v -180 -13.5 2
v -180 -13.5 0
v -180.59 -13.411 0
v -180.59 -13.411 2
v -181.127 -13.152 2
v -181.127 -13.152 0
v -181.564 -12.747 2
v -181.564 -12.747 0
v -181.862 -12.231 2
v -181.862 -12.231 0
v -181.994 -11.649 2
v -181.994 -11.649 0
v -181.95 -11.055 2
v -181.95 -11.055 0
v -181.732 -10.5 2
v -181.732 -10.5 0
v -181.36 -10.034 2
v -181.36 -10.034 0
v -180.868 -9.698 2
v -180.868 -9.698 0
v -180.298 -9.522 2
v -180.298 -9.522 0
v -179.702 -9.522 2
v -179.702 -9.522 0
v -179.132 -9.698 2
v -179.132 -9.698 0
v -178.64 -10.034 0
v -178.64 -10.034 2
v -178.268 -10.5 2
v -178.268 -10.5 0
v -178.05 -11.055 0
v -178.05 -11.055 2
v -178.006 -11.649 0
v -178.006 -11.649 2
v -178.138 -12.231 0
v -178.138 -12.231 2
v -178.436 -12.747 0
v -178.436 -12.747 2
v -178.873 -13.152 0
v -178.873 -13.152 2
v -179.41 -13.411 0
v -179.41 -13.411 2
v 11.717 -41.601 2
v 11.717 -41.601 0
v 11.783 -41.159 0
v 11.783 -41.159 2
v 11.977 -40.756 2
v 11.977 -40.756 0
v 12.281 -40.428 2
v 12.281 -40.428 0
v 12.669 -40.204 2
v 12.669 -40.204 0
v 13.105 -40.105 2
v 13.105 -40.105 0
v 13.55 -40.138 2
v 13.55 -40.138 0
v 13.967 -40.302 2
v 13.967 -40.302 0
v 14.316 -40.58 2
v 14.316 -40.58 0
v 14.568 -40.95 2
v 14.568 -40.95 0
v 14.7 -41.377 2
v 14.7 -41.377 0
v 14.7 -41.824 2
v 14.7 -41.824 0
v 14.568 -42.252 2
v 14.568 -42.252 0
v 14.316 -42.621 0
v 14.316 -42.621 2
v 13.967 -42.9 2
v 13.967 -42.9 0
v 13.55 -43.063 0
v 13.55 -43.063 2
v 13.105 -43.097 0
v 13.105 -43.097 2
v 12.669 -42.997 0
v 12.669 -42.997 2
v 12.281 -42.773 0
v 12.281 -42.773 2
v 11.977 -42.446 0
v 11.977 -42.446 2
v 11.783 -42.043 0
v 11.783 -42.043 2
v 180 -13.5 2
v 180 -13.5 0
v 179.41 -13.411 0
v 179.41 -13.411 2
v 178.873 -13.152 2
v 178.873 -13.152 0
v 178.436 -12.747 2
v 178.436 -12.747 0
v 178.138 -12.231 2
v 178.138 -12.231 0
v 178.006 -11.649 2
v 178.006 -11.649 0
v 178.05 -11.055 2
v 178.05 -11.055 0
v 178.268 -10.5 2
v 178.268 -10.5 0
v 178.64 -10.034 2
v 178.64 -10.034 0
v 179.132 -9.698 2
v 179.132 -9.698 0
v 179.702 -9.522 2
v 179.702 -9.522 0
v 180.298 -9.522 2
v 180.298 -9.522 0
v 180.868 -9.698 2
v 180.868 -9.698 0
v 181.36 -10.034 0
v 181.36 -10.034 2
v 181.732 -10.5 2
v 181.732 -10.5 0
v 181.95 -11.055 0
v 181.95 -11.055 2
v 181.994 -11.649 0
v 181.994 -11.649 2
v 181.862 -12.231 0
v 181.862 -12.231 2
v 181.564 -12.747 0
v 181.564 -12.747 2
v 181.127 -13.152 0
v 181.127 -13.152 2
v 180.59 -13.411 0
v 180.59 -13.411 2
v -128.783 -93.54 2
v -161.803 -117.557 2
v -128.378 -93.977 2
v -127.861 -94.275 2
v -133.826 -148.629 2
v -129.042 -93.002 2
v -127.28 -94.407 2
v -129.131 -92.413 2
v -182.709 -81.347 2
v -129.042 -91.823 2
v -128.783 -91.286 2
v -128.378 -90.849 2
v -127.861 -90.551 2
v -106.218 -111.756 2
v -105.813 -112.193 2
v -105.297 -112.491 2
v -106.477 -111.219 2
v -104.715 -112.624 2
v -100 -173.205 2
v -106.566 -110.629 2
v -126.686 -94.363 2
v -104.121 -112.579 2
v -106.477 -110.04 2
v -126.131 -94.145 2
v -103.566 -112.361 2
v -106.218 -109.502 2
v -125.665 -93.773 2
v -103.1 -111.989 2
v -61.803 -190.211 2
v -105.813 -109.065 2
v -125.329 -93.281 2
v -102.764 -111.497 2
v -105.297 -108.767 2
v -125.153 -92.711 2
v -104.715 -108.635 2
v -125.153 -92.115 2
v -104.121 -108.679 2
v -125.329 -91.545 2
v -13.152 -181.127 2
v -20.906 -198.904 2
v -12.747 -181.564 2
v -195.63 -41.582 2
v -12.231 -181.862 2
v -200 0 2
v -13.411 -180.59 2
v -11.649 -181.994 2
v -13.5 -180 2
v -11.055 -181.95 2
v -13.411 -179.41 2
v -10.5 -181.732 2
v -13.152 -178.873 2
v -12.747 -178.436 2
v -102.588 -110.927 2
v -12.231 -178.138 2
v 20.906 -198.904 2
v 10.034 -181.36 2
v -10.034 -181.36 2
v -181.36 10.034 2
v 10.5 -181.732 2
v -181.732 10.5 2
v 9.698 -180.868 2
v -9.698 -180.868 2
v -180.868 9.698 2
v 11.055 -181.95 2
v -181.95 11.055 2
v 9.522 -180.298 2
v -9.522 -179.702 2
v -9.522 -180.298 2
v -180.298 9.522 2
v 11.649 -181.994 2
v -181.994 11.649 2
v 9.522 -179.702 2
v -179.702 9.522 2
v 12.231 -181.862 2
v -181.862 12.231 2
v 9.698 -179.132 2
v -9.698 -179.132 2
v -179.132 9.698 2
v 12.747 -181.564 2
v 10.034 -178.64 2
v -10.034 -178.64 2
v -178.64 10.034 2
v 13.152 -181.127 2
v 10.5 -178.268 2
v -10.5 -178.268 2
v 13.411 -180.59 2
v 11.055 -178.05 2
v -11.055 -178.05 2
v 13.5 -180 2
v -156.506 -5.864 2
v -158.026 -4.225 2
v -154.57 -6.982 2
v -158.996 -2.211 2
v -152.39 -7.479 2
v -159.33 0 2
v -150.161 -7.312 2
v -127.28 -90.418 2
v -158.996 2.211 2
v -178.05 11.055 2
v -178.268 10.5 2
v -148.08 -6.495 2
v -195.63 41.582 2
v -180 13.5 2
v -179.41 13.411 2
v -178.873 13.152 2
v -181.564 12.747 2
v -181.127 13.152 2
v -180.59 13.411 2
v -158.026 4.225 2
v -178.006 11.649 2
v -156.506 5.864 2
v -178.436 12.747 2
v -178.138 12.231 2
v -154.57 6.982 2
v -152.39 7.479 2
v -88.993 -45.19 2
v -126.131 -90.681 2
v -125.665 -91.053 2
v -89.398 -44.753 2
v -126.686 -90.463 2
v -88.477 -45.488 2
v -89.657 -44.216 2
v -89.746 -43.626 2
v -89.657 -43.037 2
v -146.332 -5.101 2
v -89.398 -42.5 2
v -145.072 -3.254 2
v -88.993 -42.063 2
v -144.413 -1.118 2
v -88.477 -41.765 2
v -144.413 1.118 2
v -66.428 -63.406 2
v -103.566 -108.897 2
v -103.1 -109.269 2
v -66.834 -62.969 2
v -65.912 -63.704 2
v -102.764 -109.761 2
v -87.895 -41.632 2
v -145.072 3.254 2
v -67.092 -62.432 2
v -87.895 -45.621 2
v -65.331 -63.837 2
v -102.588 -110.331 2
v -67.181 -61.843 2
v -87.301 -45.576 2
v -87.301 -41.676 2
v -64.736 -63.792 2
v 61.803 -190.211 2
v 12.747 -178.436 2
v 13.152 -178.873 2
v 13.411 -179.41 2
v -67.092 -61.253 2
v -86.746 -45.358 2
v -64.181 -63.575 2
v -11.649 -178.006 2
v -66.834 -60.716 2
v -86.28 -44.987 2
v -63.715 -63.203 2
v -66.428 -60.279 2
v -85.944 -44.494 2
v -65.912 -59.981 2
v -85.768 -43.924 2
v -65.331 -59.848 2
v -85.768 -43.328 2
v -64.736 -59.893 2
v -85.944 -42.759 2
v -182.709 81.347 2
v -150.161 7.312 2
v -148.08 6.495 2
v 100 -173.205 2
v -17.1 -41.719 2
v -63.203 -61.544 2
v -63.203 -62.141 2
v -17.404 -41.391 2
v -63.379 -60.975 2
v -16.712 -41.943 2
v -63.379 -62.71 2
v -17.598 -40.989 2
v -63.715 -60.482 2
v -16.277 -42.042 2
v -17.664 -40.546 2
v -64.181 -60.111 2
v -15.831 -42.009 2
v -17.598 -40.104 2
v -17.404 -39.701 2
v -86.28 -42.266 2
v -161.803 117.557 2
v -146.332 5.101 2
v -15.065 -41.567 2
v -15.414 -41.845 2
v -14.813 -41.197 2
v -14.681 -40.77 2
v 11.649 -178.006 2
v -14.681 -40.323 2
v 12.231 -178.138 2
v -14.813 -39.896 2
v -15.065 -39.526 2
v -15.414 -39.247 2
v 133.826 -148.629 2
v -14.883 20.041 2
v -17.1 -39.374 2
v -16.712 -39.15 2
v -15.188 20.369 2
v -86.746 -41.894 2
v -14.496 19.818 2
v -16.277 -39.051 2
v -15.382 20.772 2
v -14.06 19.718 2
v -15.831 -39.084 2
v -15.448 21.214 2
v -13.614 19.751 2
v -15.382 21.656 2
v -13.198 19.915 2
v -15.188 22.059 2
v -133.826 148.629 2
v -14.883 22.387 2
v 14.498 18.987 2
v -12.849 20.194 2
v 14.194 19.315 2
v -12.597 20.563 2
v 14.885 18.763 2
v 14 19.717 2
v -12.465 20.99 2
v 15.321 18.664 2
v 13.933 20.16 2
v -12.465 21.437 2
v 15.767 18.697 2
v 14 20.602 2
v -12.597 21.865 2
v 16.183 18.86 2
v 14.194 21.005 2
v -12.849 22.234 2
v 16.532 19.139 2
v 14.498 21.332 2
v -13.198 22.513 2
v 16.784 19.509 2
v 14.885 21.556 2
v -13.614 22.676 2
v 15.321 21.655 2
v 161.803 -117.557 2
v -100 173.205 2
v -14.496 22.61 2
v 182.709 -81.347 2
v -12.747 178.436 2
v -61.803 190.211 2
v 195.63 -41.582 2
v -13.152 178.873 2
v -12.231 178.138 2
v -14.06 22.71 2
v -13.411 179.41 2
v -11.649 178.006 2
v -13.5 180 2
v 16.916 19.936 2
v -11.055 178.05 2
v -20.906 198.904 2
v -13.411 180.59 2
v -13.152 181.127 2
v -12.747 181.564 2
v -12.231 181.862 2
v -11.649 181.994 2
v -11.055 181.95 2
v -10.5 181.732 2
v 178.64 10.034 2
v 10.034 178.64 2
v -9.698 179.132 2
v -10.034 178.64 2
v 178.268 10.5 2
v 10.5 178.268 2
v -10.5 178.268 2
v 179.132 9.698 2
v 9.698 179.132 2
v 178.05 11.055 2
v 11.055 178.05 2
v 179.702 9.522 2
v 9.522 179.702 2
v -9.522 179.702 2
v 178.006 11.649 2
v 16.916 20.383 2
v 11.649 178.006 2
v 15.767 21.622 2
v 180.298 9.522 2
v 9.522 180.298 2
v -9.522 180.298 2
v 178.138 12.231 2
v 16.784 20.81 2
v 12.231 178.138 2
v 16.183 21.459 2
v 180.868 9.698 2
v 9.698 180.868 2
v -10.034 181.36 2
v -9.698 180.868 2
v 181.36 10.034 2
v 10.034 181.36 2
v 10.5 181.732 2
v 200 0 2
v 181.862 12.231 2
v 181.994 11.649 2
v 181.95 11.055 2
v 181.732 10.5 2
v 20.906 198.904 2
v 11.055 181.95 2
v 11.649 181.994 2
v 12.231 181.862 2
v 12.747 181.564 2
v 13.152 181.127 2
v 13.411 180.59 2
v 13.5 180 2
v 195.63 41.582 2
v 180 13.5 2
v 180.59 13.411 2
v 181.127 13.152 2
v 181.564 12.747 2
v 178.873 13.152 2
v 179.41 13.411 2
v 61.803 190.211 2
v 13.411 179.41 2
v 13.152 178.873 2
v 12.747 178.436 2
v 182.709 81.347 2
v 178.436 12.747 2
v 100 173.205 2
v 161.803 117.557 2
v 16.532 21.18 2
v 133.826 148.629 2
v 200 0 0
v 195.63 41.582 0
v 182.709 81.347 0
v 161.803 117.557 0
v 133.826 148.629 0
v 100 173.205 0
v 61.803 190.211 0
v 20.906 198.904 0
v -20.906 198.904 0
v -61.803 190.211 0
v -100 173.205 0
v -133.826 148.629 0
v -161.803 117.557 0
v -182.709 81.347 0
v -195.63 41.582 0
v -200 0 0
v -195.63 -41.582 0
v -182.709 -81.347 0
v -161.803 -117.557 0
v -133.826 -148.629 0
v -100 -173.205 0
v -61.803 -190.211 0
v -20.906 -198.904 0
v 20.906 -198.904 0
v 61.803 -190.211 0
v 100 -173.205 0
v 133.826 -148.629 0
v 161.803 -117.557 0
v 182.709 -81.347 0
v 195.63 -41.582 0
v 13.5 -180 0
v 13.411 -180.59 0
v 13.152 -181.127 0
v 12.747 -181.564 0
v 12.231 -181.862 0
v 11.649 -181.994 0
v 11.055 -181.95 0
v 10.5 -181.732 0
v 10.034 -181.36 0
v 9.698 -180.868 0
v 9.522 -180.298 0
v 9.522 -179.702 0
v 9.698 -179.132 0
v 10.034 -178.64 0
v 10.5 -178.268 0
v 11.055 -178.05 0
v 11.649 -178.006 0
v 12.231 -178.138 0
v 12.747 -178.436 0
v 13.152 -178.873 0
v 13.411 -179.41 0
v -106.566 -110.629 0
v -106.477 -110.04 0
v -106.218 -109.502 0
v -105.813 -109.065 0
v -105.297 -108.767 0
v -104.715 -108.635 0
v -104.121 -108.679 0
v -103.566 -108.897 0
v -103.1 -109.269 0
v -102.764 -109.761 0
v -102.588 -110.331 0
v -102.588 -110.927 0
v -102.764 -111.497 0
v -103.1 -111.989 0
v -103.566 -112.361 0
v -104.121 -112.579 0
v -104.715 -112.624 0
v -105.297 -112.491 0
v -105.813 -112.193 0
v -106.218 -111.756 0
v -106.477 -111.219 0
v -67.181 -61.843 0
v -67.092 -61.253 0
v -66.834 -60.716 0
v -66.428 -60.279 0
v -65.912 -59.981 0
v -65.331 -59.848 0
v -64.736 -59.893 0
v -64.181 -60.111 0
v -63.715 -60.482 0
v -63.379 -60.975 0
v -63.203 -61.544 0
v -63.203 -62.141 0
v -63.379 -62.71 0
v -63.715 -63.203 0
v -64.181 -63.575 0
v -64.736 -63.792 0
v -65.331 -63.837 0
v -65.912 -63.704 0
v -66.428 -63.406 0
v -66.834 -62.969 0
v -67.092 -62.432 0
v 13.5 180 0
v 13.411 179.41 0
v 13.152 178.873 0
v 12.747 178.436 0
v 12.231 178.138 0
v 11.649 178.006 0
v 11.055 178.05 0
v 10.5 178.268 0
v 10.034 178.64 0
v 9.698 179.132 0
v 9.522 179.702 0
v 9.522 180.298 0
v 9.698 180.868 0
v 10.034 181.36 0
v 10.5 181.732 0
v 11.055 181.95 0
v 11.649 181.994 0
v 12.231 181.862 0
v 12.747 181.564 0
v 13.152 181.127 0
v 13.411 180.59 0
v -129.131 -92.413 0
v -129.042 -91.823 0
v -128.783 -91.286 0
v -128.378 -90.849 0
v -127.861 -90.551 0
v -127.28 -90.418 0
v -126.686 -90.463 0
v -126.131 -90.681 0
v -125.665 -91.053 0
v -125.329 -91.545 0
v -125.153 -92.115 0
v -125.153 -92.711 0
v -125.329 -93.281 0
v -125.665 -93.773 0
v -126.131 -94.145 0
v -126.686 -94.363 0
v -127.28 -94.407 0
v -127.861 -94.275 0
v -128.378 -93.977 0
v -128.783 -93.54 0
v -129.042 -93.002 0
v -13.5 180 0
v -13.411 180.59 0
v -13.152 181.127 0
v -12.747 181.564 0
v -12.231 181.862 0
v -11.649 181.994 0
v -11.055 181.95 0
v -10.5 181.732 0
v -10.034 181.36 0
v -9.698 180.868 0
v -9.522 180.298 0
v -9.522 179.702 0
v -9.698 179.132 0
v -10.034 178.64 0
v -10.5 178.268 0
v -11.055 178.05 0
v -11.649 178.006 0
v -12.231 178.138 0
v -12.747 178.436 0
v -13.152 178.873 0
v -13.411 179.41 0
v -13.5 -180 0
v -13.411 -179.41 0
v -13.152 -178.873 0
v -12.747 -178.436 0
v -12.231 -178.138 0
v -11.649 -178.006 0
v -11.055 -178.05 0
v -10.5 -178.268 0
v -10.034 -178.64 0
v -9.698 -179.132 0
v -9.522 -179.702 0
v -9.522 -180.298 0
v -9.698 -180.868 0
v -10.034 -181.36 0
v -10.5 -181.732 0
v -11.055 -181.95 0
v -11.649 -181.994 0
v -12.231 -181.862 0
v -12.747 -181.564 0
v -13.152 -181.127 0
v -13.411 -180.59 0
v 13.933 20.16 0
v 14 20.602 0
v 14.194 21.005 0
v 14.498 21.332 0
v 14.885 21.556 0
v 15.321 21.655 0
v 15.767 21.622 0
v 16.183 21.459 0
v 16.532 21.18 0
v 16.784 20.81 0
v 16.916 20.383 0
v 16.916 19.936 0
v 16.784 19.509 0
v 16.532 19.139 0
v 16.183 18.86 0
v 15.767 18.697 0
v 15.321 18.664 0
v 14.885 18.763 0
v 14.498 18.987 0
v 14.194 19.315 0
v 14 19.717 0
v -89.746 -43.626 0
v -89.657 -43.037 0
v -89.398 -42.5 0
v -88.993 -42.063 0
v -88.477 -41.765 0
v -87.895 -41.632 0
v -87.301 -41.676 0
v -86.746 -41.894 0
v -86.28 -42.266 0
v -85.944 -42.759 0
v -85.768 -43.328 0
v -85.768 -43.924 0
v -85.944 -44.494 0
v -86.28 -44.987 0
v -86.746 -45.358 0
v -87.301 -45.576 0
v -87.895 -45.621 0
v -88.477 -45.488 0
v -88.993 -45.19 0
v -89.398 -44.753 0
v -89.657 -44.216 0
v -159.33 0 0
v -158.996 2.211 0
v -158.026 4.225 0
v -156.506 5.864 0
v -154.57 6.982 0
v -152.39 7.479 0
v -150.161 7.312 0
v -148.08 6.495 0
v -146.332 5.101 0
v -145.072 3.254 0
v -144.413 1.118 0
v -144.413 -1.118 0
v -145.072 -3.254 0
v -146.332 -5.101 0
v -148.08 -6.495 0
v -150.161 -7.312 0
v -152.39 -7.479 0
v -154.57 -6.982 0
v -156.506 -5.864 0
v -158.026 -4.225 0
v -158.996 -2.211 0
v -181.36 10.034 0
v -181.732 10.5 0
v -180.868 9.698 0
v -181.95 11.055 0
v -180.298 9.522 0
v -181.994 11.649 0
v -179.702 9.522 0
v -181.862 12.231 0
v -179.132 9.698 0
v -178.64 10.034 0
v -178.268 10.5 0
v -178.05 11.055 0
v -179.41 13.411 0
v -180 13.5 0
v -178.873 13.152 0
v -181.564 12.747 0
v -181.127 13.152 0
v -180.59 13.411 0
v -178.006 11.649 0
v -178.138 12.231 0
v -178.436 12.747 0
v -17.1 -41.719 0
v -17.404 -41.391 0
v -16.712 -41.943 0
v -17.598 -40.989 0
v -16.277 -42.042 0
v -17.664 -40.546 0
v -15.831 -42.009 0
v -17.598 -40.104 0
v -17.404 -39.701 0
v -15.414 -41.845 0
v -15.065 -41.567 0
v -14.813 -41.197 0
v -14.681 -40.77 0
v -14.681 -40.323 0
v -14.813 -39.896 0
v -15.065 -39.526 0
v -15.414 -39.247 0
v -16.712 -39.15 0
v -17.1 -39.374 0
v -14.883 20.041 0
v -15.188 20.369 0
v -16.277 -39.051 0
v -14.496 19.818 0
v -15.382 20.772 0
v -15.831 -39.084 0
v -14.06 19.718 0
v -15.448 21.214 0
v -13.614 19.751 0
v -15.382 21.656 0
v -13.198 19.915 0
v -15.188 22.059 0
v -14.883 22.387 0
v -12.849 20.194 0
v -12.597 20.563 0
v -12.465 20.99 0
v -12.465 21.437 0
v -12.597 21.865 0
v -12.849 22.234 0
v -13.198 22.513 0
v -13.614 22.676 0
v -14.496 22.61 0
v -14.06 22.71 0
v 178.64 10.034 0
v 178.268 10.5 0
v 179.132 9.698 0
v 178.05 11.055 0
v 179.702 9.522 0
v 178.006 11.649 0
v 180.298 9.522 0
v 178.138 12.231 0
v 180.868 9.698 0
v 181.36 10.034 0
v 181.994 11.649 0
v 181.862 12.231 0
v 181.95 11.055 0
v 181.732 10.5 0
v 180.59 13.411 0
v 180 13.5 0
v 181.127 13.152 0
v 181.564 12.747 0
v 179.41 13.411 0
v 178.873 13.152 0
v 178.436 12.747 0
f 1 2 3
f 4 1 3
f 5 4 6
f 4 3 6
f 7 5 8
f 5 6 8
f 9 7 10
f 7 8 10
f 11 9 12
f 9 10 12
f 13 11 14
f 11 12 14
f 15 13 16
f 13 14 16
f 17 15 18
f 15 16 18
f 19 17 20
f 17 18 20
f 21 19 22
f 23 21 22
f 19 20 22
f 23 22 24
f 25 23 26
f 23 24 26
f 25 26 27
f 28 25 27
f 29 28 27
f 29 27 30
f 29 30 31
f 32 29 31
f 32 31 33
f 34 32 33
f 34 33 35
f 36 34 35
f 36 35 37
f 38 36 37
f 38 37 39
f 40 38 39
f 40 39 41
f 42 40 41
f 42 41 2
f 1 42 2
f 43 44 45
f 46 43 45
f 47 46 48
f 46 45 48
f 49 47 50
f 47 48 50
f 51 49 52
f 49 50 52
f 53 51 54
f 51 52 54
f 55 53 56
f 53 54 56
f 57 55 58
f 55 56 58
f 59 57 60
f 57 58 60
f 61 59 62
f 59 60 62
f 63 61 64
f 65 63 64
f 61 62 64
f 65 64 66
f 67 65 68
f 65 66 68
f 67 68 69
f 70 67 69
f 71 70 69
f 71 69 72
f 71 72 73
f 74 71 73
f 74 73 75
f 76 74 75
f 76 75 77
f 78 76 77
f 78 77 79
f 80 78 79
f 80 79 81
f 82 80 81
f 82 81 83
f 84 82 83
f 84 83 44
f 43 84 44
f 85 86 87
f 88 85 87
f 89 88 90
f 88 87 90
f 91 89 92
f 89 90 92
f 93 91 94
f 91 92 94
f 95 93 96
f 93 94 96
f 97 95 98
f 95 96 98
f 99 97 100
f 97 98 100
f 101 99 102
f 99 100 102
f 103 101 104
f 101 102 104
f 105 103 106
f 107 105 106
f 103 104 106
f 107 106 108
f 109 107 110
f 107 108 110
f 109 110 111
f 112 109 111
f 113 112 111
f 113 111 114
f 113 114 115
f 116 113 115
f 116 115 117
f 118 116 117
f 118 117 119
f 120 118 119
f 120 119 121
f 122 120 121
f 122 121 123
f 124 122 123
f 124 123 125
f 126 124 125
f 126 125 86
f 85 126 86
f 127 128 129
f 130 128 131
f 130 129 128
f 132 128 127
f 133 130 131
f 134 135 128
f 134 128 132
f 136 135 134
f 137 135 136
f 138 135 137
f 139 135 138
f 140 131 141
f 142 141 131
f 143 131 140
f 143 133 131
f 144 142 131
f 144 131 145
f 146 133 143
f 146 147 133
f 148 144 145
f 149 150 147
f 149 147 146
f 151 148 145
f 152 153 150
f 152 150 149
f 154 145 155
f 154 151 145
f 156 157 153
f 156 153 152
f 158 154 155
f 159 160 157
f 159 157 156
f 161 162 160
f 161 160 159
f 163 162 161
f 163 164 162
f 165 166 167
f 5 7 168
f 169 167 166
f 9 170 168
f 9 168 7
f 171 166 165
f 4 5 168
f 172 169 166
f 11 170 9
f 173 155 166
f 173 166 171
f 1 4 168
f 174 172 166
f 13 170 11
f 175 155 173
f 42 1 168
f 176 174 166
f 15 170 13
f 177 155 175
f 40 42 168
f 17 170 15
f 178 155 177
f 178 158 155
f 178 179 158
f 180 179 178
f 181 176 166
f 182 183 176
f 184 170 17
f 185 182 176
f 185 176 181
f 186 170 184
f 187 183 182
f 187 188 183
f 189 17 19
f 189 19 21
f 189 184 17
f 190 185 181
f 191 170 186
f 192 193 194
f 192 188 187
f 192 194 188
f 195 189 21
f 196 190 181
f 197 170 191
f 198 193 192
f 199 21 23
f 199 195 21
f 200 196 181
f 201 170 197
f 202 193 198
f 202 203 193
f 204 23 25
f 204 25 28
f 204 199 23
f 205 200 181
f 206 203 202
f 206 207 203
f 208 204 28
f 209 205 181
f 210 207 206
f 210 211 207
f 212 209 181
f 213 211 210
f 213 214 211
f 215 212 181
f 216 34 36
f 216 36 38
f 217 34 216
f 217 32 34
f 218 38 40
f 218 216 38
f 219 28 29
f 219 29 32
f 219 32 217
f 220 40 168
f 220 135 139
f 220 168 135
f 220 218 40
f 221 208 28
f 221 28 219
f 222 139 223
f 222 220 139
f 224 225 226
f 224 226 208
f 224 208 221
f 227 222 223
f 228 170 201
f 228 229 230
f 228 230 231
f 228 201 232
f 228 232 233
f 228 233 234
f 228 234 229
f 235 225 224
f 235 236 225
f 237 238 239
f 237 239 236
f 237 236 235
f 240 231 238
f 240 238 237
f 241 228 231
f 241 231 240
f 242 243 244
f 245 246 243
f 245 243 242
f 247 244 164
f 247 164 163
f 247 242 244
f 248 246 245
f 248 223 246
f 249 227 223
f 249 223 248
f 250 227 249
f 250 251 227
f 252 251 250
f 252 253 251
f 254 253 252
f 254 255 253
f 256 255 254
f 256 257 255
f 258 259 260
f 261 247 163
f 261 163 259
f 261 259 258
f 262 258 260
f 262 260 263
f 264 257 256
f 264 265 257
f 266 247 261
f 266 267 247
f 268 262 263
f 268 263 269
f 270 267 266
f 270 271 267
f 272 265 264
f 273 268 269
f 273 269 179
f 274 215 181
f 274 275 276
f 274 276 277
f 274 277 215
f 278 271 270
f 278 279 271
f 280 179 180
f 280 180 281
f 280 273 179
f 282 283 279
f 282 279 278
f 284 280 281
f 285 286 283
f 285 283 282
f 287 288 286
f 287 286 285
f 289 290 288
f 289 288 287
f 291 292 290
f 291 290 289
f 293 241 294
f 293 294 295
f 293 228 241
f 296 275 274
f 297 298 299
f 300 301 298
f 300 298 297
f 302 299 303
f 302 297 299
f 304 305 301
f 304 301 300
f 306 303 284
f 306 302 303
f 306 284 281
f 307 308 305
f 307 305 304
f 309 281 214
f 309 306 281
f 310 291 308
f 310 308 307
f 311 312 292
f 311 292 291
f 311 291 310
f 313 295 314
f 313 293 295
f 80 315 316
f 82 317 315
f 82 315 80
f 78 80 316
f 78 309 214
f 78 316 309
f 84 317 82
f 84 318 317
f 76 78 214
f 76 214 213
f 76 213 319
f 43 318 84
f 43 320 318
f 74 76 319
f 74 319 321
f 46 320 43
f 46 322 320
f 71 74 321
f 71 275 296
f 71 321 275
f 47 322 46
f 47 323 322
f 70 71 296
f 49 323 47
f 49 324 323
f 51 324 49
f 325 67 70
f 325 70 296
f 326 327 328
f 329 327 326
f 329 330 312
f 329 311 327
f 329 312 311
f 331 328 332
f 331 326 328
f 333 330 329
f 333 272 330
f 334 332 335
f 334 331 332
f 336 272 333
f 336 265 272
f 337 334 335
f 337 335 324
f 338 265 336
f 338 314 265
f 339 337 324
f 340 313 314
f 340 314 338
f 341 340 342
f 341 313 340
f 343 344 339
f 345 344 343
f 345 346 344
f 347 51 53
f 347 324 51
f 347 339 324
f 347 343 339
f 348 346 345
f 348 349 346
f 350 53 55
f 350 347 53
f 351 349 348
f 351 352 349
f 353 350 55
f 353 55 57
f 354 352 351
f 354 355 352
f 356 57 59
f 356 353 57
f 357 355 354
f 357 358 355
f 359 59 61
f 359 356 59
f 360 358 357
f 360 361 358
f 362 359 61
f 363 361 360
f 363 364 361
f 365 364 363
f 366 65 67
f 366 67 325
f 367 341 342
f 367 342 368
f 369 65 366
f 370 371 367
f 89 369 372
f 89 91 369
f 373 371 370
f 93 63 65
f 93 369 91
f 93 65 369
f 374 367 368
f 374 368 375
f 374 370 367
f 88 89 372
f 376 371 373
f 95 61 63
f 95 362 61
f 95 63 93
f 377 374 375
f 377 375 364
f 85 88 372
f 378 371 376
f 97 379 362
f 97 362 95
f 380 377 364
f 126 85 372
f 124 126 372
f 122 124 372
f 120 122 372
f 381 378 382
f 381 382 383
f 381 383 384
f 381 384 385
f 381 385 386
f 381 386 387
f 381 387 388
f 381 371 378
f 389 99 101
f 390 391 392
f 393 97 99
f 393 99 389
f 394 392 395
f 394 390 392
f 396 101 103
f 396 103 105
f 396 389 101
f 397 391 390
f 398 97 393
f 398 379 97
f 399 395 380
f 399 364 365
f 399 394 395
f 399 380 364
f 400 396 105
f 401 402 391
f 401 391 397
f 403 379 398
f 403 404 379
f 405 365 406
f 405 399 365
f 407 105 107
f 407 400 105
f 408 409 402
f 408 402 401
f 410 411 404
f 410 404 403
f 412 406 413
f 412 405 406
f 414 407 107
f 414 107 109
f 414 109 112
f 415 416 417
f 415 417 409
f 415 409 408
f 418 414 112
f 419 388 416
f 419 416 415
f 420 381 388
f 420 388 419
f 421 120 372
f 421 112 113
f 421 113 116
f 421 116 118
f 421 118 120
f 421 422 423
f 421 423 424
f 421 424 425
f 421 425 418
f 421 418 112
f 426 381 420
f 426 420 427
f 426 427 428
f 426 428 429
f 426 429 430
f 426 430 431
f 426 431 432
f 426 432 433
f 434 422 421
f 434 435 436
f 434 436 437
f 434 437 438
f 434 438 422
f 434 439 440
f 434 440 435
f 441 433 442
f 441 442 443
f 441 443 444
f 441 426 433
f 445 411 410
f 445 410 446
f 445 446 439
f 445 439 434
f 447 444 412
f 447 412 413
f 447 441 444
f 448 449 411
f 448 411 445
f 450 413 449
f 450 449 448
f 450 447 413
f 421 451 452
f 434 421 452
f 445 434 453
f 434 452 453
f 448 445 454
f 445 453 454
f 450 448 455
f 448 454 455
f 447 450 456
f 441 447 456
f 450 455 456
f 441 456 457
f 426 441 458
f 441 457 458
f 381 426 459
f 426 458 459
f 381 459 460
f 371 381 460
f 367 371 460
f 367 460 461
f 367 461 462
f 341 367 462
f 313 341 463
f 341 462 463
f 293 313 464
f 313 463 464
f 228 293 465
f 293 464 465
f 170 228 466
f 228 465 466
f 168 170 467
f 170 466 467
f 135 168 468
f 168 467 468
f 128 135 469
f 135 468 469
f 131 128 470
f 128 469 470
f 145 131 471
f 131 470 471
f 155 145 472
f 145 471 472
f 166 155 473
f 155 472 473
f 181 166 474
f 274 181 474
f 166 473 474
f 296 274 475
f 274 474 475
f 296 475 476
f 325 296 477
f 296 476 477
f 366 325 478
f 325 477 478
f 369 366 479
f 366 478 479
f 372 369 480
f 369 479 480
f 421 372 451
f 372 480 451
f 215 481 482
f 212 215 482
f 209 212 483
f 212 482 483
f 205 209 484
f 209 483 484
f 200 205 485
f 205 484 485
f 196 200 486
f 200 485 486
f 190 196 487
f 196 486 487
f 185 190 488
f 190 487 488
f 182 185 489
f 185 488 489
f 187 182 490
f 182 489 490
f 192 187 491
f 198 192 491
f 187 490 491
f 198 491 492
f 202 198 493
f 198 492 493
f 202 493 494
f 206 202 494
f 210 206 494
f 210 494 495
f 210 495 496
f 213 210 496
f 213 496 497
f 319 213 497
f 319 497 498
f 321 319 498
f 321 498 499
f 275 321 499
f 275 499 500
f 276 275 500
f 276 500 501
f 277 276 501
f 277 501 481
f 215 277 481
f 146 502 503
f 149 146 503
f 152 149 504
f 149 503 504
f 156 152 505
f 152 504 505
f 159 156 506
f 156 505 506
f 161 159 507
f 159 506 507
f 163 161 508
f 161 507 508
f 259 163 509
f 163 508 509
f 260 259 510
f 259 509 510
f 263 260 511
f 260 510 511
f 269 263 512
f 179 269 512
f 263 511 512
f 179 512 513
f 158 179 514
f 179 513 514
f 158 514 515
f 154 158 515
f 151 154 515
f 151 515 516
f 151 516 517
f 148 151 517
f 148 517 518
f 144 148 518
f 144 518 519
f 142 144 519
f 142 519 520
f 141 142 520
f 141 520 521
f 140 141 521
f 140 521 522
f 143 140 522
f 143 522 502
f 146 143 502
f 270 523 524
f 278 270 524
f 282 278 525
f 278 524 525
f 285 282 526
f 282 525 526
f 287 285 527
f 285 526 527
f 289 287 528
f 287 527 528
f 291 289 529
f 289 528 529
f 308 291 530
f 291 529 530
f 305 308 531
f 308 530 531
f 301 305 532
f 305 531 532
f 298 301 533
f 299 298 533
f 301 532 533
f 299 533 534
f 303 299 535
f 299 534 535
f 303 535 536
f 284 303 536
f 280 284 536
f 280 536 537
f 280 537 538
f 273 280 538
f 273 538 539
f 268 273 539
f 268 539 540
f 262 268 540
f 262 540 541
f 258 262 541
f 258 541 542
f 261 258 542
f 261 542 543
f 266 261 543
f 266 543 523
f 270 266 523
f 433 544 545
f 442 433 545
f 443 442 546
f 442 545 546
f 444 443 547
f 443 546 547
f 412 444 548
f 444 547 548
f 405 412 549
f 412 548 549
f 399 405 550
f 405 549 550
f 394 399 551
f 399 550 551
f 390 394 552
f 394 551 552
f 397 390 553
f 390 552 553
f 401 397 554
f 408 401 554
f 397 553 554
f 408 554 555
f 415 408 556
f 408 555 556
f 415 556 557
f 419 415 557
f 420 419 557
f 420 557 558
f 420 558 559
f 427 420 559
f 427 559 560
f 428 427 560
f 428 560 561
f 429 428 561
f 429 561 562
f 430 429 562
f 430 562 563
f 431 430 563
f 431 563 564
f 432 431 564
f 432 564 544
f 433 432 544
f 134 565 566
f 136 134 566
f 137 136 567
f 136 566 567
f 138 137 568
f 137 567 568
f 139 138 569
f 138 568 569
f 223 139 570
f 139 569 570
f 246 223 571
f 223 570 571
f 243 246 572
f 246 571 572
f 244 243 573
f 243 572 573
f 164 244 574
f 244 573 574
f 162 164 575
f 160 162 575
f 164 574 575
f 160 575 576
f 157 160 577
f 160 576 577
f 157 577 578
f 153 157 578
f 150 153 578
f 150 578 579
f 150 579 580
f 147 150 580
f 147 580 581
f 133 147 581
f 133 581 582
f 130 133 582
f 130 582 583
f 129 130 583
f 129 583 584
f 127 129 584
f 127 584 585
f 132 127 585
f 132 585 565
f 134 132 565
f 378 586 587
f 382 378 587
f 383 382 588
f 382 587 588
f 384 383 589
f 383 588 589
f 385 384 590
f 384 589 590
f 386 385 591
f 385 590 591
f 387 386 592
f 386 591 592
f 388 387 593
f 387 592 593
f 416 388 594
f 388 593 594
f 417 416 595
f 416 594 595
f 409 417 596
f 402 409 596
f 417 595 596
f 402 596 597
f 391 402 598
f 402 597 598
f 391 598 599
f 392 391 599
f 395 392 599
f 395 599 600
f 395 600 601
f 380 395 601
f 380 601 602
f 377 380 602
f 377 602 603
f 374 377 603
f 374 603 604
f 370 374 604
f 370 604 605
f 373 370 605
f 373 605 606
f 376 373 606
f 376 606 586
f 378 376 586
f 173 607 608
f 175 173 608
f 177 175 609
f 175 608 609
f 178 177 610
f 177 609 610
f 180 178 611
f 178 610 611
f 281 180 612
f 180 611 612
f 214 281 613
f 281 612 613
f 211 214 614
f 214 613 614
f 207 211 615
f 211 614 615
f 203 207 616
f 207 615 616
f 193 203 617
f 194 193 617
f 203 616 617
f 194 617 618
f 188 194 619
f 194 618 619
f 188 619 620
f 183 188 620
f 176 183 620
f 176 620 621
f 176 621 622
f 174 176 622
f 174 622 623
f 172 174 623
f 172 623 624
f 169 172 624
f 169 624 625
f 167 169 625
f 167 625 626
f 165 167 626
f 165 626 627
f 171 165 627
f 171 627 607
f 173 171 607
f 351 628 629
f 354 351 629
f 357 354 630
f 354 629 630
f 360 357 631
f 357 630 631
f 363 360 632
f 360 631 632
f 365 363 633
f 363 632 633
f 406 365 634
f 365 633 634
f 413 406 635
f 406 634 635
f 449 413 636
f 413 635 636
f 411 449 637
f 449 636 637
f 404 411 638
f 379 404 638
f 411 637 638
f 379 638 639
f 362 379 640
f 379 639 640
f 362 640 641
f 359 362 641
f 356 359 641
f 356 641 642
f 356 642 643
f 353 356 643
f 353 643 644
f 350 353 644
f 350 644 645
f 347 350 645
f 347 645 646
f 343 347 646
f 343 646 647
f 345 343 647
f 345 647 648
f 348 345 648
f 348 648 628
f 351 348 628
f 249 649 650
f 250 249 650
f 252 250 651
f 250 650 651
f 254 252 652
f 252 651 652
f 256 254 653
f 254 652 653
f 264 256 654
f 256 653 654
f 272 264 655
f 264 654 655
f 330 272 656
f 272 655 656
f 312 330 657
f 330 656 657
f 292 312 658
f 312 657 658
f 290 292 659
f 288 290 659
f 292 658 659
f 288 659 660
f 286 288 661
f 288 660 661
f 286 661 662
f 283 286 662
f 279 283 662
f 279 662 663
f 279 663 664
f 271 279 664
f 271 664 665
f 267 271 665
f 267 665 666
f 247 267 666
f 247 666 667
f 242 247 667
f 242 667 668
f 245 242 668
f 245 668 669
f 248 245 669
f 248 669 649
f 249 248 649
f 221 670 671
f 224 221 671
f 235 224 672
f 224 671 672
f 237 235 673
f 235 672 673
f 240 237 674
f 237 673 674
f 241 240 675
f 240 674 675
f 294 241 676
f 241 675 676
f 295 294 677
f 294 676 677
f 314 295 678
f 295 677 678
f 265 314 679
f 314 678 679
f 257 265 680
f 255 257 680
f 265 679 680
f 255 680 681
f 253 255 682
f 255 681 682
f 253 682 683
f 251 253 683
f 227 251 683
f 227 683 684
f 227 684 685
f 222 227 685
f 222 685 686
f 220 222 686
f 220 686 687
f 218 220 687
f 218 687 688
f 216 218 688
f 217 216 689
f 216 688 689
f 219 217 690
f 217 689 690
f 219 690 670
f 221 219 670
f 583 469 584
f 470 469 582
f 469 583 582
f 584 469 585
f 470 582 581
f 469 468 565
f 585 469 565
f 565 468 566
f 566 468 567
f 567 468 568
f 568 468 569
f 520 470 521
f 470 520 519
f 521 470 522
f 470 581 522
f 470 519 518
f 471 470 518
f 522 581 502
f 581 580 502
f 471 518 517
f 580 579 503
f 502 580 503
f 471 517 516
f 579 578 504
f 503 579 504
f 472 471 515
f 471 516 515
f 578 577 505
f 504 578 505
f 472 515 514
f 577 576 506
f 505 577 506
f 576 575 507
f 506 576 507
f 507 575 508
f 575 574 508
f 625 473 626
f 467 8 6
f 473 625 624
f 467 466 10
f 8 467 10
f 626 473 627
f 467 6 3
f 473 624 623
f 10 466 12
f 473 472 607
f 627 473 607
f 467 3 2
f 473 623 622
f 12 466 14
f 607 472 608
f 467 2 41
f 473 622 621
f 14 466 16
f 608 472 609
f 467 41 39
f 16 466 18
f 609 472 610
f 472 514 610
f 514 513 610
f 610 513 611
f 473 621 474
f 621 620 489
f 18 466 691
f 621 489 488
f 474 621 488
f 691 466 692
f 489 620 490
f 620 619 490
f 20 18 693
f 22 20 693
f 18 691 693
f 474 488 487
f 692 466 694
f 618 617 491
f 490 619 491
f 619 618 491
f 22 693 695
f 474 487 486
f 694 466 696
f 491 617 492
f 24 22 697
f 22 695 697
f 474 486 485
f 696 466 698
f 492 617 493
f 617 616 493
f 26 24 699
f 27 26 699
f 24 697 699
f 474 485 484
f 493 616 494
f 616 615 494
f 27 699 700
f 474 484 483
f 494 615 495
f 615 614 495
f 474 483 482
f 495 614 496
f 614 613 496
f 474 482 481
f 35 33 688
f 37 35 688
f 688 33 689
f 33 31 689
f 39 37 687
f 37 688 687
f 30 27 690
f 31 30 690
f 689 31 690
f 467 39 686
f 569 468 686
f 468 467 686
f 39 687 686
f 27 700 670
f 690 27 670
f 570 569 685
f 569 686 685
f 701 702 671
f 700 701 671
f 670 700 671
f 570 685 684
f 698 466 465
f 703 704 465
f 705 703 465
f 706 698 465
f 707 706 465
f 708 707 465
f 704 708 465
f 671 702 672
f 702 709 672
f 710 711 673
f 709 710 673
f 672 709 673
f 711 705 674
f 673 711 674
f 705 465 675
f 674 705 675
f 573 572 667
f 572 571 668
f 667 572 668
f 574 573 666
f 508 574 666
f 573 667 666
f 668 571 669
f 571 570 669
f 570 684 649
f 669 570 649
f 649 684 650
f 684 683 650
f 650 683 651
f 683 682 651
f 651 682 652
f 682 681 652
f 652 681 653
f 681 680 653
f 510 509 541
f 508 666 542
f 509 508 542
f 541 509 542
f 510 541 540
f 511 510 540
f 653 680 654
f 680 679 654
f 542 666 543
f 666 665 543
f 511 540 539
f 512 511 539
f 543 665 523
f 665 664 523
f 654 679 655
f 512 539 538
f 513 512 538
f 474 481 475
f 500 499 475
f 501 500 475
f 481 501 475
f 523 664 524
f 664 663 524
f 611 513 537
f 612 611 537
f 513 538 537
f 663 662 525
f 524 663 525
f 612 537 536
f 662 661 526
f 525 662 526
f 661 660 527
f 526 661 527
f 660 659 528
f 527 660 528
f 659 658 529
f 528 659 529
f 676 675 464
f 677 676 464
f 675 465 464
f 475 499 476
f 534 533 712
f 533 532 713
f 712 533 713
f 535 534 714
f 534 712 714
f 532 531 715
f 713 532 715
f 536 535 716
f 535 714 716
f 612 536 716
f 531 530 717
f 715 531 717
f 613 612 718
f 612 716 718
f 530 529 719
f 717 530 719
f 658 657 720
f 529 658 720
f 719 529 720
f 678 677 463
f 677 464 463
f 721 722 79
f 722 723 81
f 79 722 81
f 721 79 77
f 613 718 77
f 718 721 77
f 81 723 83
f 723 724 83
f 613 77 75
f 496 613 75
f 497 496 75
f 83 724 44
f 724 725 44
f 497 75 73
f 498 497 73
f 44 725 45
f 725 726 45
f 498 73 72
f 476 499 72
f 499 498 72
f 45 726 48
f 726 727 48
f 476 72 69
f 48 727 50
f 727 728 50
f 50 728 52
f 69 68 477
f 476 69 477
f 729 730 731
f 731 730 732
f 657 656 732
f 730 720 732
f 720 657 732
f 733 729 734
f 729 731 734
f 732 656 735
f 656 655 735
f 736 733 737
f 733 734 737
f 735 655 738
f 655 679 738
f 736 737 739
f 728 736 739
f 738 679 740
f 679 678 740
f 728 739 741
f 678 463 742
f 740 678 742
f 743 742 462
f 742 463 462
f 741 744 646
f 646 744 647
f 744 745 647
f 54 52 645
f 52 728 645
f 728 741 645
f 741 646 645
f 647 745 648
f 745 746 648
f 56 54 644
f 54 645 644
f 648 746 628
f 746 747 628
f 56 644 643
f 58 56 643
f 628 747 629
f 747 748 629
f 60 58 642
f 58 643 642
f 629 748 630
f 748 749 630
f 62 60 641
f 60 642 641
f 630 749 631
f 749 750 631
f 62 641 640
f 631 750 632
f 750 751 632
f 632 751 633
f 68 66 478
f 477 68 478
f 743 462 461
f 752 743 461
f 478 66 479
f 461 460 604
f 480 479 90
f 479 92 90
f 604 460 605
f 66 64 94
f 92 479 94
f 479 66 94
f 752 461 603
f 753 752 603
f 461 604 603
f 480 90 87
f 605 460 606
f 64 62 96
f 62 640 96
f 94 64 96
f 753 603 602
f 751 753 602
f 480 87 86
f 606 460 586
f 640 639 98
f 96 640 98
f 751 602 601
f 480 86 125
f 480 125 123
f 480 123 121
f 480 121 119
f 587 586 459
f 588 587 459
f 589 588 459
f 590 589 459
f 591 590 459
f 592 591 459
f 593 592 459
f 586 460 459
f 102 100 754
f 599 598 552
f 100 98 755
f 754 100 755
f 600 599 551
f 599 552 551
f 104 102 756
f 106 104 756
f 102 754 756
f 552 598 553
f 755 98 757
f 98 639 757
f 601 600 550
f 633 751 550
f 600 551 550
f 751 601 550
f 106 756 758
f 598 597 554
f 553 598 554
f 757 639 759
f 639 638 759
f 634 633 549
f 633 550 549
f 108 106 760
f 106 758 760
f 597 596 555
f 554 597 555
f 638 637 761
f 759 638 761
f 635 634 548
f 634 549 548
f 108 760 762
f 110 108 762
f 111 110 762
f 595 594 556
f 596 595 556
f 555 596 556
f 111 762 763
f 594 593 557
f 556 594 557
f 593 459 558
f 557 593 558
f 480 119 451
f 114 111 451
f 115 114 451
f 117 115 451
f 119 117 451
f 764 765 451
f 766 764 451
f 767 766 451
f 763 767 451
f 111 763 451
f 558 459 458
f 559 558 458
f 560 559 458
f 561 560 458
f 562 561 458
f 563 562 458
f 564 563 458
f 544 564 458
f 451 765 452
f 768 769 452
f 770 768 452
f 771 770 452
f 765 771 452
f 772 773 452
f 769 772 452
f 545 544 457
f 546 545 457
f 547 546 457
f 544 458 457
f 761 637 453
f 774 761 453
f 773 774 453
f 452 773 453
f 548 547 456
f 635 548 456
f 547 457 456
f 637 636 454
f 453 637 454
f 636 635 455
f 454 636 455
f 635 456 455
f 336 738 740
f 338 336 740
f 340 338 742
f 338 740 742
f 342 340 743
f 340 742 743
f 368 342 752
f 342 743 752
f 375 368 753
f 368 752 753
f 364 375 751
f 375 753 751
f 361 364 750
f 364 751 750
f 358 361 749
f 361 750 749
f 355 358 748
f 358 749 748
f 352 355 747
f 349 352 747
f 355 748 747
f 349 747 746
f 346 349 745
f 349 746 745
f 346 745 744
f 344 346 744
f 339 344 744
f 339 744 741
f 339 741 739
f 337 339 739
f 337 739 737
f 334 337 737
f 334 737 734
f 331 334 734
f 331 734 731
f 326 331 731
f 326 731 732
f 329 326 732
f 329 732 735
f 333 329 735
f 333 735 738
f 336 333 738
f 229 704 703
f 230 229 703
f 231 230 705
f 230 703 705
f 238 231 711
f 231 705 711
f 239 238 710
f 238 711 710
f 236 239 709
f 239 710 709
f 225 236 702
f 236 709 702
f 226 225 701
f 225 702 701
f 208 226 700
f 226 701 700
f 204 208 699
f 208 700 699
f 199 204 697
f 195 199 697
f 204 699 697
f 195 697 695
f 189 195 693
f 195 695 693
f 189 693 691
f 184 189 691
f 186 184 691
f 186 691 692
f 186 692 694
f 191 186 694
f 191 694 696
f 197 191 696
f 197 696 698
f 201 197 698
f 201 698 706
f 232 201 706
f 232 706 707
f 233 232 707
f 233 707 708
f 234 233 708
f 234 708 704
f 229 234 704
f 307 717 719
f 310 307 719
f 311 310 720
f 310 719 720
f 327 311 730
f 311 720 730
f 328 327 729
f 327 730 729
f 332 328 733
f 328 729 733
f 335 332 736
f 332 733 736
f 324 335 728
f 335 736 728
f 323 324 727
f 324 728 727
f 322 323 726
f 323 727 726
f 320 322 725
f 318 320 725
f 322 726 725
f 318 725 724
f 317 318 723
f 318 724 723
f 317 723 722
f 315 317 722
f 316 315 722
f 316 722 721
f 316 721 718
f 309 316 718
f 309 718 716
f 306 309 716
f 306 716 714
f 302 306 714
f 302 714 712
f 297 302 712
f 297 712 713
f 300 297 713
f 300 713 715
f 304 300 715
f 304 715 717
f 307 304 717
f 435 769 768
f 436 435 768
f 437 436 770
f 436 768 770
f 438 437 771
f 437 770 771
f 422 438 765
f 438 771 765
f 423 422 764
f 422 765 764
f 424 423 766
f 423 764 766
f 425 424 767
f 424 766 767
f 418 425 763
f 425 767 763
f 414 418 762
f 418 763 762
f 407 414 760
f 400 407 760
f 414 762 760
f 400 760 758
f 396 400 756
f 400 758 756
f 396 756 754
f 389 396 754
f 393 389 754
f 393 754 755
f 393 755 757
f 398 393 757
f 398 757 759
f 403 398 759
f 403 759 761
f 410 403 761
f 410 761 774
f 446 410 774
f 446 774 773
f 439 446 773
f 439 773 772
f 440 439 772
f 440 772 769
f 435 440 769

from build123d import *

# Parameters (mm, degrees)
SKETCH1_R           = 200
BOSS_EXTRUDE1_DEPTH = 2
SKETCH2_R           = 2
CUT_EXTRUDE1_DEPTH  = 13
CIRPATTERN1_COUNT   = 4
SKETCH5_R           = 7.5
CUT_EXTRUDE3_DEPTH  = 2
SKETCH7_R           = 2
CUT_EXTRUDE4_DEPTH  = 10
SKETCH8_R           = 1.5
CUT_EXTRUDE5_DEPTH  = 10


with BuildPart() as part:
    # Sketch1 → Boss-Extrude1 (new body)
    with BuildSketch(Plane.XY):
        Circle(SKETCH1_R)
    extrude(amount=BOSS_EXTRUDE1_DEPTH)

    # Sketch2 → Cut-Extrude1 (cut)
    with BuildSketch(Plane(origin=(0, 0, 0), x_dir=(-1, 0, 0), z_dir=(0, 0, -1))):
        with Locations((11.5, 180)):
            Circle(SKETCH2_R)
        with Locations(Location((-11.5, 180, 0), (0, 0, 180))):
            Circle(SKETCH2_R)
    cut_extrude1 = extrude(amount=-CUT_EXTRUDE1_DEPTH, mode=Mode.SUBTRACT)

    # CirPattern1: Cut-Extrude1 ×4 about axis
    cirpattern1_axis = Axis((0, 0, 0), (0, 0, 1))
    for i in range(1, CIRPATTERN1_COUNT):
        add(cut_extrude1.rotate(cirpattern1_axis, i * 360 / CIRPATTERN1_COUNT), mode=Mode.SUBTRACT)

    # Sketch5 → Cut-Extrude3 (cut)
    with BuildSketch(Plane(origin=(0, 0, 0), x_dir=(-1, 0, 0), z_dir=(0, 0, -1))):
        with Locations((151.829580255, 0)):
            Circle(SKETCH5_R)
    extrude(amount=-CUT_EXTRUDE3_DEPTH, mode=Mode.SUBTRACT)

    # Sketch7 → Cut-Extrude4 (cut)
    with BuildSketch(Plane(origin=(0, 0, 0), x_dir=(-1, 0, 0), z_dir=(0, 0, -1))):
        with Locations((127.130690154, -92.412874198)):
            Circle(SKETCH7_R)
        with Locations((104.565936539, -110.629127773)):
            Circle(SKETCH7_R)
        with Locations((65.181140017, -61.842574268)):
            Circle(SKETCH7_R)
        with Locations((87.745893632, -43.626320693)):
            Circle(SKETCH7_R)
    extrude(amount=-CUT_EXTRUDE4_DEPTH, mode=Mode.SUBTRACT)

    # Sketch8 → Cut-Extrude5 (cut)
    with BuildSketch(Plane(origin=(0, 0, 0), x_dir=(-1, 0, 0), z_dir=(0, 0, -1))):
        with Locations((-15.432875064, 20.159522992)):
            Circle(SKETCH8_R)
        with Locations((13.948214091, 21.213847451)):
            Circle(SKETCH8_R)
        with Locations((-13.216642017, -41.60072564)):
            Circle(SKETCH8_R)
        with Locations((16.164447138, -40.546401181)):
            Circle(SKETCH8_R)
    extrude(amount=-CUT_EXTRUDE5_DEPTH, mode=Mode.SUBTRACT)


solid = part.part
